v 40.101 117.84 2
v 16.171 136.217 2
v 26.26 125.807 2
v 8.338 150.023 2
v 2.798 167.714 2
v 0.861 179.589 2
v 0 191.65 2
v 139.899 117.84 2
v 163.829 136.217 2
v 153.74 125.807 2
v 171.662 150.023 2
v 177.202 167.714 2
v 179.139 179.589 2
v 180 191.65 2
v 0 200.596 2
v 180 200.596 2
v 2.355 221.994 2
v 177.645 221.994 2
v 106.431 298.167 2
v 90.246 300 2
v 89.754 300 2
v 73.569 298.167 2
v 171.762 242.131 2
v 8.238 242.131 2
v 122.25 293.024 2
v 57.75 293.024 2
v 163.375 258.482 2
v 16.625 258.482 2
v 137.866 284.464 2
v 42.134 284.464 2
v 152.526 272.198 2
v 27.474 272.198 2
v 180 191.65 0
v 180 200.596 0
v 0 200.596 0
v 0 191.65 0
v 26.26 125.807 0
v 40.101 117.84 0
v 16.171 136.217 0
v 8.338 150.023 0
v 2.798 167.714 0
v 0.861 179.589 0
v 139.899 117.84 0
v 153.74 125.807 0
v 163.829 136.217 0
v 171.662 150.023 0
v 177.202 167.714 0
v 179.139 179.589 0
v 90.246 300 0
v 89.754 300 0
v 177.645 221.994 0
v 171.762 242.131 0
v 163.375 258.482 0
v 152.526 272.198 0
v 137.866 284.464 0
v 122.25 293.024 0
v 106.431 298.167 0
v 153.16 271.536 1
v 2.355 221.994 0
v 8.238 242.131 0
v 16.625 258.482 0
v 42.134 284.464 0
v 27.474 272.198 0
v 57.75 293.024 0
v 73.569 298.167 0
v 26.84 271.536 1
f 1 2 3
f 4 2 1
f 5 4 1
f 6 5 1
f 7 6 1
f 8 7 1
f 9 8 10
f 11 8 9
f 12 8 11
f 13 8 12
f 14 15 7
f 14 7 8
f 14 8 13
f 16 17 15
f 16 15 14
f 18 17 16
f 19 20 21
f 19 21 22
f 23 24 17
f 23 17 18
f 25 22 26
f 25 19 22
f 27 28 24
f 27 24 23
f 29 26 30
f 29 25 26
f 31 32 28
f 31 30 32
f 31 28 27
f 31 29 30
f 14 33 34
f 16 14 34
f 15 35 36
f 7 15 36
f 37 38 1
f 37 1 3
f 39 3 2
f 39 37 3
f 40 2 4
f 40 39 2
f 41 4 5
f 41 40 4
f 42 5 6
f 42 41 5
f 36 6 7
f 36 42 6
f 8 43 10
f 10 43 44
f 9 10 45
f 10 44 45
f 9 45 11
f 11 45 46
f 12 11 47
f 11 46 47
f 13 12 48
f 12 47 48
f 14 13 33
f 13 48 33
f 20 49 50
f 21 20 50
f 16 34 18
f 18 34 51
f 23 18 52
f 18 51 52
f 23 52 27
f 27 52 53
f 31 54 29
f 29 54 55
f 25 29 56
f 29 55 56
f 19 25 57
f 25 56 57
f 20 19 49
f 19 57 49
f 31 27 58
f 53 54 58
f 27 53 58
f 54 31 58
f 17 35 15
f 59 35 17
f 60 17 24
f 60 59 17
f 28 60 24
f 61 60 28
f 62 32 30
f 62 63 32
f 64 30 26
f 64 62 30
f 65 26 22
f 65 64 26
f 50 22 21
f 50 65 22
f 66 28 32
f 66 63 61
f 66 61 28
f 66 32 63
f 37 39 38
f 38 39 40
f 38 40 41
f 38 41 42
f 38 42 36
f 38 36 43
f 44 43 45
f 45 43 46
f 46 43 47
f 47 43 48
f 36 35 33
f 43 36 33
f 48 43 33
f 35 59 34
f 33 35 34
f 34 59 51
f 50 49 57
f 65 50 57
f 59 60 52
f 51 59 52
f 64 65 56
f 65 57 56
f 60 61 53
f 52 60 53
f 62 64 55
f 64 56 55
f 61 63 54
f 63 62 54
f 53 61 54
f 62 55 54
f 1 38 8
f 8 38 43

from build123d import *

# Parameters (mm, degrees)
BOSS_EXTRUDE2_DEPTH = 2


with BuildPart() as part:
    # Sketch1 → Boss-Extrude2 (new body)
    with BuildSketch(Plane.XY):
        with BuildLine():
            Line((0, 200.595525294), (0, 191.65032035))
            add(Edge.make_bspline(
                [(40.101032839, 117.840442967), (35.50049979, 120.099470076), (28.290809806, 123.632993412), (7.151679686, 142.893766889), (0.6682659, 169.378414193), (0, 191.65032035)],
                knots=[0.15765272, 0.15765272, 0.15765272, 0.15765272, 0.211663242, 0.246387134, 0.464099584, 0.464099584, 0.464099584, 0.464099584], degree=3))
            Line((40.101032839, 117.840442967), (139.898967161, 117.840442967))
            add(Edge.make_bspline(
                [(139.898967161, 117.840442967), (144.49950021, 120.099470076), (151.709190194, 123.632993412), (172.848320314, 142.893766889), (179.3317341, 169.378414193), (180, 191.65032035)],
                knots=[0.15765272, 0.15765272, 0.15765272, 0.15765272, 0.211663242, 0.246387134, 0.464099584, 0.464099584, 0.464099584, 0.464099584], degree=3))
            Line((180, 191.65032035), (180, 200.595525294))
            add(Edge.make_bspline(
                [(180, 200.595525294), (179.179346149, 227.438302674), (163.29910964, 275.970123499), (113.184129082, 299.959310061), (90.245728189, 300)],
                knots=[0.493370629, 0.493370629, 0.493370629, 0.493370629, 0.75821873, 0.999139583, 0.999139583, 0.999139583, 0.999139583], degree=3))
            Line((90.245728189, 300), (90, 300))
            Line((90, 300), (89.754271811, 300))
            add(Edge.make_bspline(
                [(0, 200.595525294), (0.820653851, 227.438302674), (16.70089036, 275.970123499), (66.815870918, 299.959310061), (89.754271811, 300)],
                knots=[0.493370629, 0.493370629, 0.493370629, 0.493370629, 0.75821873, 0.999139583, 0.999139583, 0.999139583, 0.999139583], degree=3))
        make_face()
    extrude(amount=BOSS_EXTRUDE2_DEPTH)


solid = part.part
